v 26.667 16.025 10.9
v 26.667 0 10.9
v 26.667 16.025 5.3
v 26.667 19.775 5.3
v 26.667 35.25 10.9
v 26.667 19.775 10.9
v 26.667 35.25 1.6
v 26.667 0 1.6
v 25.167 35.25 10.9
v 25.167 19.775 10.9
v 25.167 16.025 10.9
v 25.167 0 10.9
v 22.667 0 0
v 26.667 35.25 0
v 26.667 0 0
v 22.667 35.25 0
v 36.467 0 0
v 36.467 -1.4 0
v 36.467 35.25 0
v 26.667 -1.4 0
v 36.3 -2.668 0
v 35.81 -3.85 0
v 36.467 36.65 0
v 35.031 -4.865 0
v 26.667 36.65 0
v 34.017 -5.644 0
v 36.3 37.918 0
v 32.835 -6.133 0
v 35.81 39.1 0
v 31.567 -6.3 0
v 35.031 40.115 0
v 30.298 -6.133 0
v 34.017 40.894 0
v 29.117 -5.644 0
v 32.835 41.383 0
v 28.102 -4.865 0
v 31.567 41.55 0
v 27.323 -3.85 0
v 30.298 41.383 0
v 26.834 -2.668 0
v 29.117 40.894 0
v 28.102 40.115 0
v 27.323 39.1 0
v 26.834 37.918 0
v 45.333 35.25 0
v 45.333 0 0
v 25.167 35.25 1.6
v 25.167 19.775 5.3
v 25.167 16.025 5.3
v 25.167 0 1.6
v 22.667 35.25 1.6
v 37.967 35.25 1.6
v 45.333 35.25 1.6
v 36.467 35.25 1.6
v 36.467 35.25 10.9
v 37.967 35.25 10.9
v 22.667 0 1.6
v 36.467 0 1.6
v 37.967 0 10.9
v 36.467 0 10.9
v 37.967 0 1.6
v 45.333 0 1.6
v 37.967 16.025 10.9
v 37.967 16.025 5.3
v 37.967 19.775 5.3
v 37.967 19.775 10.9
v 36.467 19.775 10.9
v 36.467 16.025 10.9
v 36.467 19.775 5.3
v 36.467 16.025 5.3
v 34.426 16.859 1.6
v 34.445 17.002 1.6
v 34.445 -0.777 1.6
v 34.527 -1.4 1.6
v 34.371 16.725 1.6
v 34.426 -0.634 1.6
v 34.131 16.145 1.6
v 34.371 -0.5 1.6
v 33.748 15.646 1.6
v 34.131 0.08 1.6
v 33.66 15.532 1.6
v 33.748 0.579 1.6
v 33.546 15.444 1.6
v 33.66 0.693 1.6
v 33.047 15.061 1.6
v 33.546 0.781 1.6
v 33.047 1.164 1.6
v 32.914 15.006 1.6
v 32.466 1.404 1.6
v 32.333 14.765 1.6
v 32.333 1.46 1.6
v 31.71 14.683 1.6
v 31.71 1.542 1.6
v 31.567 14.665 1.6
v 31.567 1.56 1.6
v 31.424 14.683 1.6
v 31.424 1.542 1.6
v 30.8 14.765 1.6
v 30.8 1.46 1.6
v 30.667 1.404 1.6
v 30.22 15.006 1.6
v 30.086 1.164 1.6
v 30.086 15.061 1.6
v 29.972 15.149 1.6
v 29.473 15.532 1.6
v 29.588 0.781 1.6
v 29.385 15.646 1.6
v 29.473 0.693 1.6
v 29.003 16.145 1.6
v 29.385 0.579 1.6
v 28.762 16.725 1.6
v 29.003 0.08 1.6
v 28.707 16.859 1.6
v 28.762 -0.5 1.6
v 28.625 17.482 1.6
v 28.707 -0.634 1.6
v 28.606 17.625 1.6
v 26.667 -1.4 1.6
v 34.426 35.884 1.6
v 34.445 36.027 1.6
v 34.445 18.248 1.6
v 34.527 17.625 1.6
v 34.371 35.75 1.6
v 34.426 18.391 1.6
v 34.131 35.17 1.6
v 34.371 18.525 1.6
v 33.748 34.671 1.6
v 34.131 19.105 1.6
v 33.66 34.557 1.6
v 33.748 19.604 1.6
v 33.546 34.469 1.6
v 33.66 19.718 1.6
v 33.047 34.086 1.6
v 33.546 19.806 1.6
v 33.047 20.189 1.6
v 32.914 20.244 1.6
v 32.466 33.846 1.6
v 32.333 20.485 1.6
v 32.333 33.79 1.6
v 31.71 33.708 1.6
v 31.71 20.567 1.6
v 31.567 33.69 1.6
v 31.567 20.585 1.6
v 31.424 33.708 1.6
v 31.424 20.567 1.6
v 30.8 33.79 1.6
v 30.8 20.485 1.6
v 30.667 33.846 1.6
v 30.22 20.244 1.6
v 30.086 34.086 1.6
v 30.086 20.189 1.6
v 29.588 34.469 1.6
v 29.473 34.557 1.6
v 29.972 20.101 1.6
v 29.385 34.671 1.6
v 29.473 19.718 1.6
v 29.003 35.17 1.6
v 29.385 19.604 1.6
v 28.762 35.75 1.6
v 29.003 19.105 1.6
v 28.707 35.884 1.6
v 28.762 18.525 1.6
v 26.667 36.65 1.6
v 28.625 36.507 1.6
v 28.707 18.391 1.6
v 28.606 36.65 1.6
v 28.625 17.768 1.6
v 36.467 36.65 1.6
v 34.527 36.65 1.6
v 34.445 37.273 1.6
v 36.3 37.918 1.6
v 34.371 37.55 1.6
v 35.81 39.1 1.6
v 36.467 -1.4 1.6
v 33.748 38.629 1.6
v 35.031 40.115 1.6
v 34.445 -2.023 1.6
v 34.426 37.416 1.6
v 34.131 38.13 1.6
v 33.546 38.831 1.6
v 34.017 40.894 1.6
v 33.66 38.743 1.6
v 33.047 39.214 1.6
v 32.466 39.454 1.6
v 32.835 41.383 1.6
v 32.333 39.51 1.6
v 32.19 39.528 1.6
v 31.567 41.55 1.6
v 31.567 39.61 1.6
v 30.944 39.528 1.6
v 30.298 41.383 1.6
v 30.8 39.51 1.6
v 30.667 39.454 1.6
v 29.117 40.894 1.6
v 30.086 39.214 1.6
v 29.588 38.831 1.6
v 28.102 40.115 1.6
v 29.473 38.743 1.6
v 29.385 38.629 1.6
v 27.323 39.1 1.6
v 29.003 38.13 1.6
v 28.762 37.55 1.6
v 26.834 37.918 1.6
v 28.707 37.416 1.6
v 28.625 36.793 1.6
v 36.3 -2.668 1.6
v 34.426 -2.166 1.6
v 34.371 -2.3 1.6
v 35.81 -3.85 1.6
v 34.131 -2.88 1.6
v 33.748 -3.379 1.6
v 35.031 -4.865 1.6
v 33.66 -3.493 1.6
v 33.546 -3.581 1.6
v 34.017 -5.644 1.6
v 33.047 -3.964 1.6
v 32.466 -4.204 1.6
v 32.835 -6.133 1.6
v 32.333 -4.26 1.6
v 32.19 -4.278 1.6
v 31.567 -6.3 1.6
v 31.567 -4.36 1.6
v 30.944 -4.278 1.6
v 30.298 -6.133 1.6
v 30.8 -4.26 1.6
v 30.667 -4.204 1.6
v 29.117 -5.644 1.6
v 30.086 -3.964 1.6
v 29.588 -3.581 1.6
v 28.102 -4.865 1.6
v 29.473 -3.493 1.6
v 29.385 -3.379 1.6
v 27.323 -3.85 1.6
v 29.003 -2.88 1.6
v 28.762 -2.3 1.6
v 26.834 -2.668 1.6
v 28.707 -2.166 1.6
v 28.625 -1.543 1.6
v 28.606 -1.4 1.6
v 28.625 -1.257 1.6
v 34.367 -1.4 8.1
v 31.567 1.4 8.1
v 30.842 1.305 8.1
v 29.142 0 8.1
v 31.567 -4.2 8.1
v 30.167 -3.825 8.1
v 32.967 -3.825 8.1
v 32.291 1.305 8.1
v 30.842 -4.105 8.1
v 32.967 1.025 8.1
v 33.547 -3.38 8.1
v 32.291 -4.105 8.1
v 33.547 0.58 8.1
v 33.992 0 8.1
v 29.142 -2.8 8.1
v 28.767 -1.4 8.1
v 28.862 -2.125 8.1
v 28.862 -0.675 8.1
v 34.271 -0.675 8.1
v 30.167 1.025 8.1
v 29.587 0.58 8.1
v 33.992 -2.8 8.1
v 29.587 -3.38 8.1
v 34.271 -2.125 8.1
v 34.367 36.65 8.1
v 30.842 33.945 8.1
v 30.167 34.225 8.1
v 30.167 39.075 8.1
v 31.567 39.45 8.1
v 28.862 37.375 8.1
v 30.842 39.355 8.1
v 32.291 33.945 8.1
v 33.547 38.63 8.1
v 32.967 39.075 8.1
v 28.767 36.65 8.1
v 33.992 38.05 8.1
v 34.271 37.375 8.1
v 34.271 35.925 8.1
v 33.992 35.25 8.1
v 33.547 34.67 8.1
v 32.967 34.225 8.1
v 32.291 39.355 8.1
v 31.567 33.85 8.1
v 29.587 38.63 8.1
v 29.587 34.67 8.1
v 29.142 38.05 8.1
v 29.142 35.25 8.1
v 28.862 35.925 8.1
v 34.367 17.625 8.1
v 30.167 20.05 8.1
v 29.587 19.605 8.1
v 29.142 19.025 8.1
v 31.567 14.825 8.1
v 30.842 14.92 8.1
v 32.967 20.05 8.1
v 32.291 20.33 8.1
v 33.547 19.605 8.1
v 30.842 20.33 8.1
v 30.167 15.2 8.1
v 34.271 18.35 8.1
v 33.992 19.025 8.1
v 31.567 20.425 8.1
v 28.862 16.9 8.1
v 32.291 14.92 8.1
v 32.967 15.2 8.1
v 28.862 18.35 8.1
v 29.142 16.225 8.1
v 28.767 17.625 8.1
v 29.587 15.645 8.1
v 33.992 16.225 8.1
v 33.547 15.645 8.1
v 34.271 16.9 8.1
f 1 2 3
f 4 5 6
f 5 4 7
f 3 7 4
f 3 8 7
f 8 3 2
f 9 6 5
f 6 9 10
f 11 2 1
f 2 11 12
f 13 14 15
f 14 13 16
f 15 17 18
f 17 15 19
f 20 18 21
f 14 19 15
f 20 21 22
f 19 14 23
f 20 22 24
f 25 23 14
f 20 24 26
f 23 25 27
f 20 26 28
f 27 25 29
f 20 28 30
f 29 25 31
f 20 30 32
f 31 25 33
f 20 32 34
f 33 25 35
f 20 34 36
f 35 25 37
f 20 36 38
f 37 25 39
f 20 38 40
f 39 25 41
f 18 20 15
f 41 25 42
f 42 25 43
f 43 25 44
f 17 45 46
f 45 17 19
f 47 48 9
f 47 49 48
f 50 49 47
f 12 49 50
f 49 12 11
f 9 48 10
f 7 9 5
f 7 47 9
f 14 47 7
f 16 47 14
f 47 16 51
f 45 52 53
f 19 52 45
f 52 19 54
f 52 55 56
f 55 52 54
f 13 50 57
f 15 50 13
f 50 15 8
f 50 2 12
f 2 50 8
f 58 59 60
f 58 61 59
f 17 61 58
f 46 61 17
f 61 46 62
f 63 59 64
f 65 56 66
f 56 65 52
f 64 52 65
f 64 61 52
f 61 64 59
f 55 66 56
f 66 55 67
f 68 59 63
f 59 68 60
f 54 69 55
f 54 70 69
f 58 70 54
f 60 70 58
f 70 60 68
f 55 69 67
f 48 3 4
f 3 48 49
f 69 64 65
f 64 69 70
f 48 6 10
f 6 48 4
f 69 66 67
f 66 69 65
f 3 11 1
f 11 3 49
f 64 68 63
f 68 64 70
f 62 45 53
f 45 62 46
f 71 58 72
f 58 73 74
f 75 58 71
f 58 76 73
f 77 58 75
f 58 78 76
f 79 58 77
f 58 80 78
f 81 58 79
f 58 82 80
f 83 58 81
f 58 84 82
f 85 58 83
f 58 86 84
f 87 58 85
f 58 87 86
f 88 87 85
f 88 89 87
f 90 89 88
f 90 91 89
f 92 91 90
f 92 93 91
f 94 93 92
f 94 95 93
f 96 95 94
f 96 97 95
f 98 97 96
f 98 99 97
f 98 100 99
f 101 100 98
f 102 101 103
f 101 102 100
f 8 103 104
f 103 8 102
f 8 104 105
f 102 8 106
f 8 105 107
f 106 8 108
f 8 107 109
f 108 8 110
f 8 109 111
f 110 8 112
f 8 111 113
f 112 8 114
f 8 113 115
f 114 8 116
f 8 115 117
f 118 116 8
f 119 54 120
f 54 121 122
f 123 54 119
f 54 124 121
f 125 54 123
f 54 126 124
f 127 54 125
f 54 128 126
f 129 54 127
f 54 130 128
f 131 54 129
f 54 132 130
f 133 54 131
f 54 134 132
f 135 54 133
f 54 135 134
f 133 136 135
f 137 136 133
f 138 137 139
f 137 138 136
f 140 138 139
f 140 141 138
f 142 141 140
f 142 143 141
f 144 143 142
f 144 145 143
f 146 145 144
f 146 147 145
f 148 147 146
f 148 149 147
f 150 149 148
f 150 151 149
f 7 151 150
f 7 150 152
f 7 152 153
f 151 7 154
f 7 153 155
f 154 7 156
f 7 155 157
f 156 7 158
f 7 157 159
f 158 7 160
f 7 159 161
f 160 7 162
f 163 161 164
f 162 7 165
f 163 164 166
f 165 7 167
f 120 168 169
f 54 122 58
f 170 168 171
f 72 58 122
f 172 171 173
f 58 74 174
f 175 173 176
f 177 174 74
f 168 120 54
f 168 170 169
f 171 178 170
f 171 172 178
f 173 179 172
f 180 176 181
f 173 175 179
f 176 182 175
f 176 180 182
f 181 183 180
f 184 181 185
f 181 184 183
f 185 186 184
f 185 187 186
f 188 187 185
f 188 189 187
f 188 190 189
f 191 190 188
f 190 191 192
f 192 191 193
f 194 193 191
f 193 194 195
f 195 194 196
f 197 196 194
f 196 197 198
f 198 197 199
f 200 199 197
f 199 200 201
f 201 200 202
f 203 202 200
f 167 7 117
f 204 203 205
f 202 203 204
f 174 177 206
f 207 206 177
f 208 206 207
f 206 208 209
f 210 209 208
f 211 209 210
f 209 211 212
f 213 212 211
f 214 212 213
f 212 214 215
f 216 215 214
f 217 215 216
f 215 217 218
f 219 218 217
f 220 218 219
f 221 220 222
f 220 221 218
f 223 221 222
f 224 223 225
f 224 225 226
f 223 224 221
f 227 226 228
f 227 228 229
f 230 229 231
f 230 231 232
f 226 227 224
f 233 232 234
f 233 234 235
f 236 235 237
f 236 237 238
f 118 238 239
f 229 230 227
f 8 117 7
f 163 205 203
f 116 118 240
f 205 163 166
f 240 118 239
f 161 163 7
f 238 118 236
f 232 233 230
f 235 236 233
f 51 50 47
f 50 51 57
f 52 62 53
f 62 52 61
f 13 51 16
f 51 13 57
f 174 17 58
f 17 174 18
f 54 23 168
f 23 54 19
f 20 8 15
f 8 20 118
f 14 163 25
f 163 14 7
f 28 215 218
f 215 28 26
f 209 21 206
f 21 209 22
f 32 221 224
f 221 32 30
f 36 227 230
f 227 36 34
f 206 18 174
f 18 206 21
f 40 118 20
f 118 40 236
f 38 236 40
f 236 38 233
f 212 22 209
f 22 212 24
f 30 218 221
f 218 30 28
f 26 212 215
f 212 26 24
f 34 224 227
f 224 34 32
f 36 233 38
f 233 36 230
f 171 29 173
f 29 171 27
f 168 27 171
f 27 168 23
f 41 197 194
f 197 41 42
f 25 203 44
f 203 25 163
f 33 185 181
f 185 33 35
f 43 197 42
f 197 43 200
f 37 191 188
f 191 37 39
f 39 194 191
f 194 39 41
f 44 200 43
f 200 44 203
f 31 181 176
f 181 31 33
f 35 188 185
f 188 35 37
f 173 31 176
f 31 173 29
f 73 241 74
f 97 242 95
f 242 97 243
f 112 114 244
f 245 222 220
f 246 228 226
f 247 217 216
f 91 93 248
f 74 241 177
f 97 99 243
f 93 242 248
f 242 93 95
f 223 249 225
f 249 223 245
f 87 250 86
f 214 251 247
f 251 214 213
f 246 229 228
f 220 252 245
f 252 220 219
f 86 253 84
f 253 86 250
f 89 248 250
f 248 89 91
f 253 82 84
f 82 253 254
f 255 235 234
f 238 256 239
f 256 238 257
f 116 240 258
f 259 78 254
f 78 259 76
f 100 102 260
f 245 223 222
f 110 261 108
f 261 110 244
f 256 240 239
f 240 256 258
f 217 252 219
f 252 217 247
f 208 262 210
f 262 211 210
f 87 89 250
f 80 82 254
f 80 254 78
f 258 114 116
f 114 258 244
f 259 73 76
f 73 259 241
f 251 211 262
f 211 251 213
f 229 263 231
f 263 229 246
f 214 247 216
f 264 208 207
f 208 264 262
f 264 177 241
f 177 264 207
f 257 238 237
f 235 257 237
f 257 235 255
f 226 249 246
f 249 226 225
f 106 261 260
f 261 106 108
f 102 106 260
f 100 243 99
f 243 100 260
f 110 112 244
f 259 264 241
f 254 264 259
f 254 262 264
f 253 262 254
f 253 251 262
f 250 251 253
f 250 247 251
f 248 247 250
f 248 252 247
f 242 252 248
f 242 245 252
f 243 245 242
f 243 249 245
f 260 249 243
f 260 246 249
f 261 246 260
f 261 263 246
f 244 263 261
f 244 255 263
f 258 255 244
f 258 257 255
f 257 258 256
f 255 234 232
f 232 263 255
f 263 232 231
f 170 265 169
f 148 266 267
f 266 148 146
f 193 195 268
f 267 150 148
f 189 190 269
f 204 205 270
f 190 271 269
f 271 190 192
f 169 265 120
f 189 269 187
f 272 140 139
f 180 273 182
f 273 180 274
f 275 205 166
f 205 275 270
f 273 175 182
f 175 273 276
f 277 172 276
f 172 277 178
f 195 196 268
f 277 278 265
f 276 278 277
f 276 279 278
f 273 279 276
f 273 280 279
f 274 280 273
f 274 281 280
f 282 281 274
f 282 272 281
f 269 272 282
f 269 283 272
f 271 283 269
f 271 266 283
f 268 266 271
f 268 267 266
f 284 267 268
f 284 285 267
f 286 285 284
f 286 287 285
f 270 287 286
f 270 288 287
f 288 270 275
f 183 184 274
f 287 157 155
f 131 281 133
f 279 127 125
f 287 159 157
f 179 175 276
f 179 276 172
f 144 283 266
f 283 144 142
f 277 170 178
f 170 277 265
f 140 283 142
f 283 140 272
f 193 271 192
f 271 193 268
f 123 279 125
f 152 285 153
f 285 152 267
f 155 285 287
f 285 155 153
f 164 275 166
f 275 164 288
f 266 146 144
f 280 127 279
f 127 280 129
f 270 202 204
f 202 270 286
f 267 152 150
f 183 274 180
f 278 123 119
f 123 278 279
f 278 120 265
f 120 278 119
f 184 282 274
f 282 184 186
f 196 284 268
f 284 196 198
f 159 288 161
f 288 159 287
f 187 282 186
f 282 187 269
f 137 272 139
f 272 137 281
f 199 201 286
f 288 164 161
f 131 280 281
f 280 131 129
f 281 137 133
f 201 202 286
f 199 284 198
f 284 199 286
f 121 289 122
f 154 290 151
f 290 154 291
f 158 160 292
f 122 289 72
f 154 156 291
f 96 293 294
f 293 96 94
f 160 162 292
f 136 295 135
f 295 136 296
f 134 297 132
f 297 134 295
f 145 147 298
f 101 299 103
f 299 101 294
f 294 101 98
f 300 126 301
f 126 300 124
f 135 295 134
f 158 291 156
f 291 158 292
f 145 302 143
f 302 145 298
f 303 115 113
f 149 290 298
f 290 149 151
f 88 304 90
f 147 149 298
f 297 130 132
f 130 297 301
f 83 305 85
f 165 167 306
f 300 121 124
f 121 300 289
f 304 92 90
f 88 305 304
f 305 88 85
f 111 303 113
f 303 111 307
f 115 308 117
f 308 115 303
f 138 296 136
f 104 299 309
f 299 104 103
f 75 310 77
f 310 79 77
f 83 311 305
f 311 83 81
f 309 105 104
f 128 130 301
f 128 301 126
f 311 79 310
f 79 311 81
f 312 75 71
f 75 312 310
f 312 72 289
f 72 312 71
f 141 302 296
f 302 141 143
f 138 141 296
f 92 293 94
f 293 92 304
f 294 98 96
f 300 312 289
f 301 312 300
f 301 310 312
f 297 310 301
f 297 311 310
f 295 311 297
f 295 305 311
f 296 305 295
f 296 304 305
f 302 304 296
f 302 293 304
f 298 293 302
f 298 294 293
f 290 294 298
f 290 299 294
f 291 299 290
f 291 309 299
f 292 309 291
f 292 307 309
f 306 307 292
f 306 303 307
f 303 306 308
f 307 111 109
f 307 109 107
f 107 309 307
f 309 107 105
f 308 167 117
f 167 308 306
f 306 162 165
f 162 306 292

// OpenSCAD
// number of faces in circle
$fn=24; 

// number of rows
numerical_slider = 1; // [0:10]



for ( i = [1 : numerical_slider] )
{
translate([i*(34/3*2),0,0])
union()
	{
		cube([(34/3*2),35.25,1.6]);
		translate([4,-1.4,0])cube([9.8,38.05,1.6]);
		translate([8.9,-1.4,0])cylinder(h = 1.6, r=4.9);
		translate([8.9,36.65,0])cylinder(h = 1.6, r=4.9);

		translate([8.9,-1.4,0])cylinder(h = 8.1, r1=3, r2=2.8);
		translate([8.9,36.65,0])cylinder(h = 8.1, r1=3, r2=2.8);
		translate([8.9,17.625,0])cylinder(h = 8.1, r1=3, r2=2.8);

		difference() {
		union() {
		translate([2.5,0,0])cube([1.5,35.25,10.9]);
		translate([13.8,0,0])cube([1.5,35.25,10.9]);
		}
		translate([0,16.025,5.3])cube([35.25,3.75,5.7]);
		}
	}
	
}
